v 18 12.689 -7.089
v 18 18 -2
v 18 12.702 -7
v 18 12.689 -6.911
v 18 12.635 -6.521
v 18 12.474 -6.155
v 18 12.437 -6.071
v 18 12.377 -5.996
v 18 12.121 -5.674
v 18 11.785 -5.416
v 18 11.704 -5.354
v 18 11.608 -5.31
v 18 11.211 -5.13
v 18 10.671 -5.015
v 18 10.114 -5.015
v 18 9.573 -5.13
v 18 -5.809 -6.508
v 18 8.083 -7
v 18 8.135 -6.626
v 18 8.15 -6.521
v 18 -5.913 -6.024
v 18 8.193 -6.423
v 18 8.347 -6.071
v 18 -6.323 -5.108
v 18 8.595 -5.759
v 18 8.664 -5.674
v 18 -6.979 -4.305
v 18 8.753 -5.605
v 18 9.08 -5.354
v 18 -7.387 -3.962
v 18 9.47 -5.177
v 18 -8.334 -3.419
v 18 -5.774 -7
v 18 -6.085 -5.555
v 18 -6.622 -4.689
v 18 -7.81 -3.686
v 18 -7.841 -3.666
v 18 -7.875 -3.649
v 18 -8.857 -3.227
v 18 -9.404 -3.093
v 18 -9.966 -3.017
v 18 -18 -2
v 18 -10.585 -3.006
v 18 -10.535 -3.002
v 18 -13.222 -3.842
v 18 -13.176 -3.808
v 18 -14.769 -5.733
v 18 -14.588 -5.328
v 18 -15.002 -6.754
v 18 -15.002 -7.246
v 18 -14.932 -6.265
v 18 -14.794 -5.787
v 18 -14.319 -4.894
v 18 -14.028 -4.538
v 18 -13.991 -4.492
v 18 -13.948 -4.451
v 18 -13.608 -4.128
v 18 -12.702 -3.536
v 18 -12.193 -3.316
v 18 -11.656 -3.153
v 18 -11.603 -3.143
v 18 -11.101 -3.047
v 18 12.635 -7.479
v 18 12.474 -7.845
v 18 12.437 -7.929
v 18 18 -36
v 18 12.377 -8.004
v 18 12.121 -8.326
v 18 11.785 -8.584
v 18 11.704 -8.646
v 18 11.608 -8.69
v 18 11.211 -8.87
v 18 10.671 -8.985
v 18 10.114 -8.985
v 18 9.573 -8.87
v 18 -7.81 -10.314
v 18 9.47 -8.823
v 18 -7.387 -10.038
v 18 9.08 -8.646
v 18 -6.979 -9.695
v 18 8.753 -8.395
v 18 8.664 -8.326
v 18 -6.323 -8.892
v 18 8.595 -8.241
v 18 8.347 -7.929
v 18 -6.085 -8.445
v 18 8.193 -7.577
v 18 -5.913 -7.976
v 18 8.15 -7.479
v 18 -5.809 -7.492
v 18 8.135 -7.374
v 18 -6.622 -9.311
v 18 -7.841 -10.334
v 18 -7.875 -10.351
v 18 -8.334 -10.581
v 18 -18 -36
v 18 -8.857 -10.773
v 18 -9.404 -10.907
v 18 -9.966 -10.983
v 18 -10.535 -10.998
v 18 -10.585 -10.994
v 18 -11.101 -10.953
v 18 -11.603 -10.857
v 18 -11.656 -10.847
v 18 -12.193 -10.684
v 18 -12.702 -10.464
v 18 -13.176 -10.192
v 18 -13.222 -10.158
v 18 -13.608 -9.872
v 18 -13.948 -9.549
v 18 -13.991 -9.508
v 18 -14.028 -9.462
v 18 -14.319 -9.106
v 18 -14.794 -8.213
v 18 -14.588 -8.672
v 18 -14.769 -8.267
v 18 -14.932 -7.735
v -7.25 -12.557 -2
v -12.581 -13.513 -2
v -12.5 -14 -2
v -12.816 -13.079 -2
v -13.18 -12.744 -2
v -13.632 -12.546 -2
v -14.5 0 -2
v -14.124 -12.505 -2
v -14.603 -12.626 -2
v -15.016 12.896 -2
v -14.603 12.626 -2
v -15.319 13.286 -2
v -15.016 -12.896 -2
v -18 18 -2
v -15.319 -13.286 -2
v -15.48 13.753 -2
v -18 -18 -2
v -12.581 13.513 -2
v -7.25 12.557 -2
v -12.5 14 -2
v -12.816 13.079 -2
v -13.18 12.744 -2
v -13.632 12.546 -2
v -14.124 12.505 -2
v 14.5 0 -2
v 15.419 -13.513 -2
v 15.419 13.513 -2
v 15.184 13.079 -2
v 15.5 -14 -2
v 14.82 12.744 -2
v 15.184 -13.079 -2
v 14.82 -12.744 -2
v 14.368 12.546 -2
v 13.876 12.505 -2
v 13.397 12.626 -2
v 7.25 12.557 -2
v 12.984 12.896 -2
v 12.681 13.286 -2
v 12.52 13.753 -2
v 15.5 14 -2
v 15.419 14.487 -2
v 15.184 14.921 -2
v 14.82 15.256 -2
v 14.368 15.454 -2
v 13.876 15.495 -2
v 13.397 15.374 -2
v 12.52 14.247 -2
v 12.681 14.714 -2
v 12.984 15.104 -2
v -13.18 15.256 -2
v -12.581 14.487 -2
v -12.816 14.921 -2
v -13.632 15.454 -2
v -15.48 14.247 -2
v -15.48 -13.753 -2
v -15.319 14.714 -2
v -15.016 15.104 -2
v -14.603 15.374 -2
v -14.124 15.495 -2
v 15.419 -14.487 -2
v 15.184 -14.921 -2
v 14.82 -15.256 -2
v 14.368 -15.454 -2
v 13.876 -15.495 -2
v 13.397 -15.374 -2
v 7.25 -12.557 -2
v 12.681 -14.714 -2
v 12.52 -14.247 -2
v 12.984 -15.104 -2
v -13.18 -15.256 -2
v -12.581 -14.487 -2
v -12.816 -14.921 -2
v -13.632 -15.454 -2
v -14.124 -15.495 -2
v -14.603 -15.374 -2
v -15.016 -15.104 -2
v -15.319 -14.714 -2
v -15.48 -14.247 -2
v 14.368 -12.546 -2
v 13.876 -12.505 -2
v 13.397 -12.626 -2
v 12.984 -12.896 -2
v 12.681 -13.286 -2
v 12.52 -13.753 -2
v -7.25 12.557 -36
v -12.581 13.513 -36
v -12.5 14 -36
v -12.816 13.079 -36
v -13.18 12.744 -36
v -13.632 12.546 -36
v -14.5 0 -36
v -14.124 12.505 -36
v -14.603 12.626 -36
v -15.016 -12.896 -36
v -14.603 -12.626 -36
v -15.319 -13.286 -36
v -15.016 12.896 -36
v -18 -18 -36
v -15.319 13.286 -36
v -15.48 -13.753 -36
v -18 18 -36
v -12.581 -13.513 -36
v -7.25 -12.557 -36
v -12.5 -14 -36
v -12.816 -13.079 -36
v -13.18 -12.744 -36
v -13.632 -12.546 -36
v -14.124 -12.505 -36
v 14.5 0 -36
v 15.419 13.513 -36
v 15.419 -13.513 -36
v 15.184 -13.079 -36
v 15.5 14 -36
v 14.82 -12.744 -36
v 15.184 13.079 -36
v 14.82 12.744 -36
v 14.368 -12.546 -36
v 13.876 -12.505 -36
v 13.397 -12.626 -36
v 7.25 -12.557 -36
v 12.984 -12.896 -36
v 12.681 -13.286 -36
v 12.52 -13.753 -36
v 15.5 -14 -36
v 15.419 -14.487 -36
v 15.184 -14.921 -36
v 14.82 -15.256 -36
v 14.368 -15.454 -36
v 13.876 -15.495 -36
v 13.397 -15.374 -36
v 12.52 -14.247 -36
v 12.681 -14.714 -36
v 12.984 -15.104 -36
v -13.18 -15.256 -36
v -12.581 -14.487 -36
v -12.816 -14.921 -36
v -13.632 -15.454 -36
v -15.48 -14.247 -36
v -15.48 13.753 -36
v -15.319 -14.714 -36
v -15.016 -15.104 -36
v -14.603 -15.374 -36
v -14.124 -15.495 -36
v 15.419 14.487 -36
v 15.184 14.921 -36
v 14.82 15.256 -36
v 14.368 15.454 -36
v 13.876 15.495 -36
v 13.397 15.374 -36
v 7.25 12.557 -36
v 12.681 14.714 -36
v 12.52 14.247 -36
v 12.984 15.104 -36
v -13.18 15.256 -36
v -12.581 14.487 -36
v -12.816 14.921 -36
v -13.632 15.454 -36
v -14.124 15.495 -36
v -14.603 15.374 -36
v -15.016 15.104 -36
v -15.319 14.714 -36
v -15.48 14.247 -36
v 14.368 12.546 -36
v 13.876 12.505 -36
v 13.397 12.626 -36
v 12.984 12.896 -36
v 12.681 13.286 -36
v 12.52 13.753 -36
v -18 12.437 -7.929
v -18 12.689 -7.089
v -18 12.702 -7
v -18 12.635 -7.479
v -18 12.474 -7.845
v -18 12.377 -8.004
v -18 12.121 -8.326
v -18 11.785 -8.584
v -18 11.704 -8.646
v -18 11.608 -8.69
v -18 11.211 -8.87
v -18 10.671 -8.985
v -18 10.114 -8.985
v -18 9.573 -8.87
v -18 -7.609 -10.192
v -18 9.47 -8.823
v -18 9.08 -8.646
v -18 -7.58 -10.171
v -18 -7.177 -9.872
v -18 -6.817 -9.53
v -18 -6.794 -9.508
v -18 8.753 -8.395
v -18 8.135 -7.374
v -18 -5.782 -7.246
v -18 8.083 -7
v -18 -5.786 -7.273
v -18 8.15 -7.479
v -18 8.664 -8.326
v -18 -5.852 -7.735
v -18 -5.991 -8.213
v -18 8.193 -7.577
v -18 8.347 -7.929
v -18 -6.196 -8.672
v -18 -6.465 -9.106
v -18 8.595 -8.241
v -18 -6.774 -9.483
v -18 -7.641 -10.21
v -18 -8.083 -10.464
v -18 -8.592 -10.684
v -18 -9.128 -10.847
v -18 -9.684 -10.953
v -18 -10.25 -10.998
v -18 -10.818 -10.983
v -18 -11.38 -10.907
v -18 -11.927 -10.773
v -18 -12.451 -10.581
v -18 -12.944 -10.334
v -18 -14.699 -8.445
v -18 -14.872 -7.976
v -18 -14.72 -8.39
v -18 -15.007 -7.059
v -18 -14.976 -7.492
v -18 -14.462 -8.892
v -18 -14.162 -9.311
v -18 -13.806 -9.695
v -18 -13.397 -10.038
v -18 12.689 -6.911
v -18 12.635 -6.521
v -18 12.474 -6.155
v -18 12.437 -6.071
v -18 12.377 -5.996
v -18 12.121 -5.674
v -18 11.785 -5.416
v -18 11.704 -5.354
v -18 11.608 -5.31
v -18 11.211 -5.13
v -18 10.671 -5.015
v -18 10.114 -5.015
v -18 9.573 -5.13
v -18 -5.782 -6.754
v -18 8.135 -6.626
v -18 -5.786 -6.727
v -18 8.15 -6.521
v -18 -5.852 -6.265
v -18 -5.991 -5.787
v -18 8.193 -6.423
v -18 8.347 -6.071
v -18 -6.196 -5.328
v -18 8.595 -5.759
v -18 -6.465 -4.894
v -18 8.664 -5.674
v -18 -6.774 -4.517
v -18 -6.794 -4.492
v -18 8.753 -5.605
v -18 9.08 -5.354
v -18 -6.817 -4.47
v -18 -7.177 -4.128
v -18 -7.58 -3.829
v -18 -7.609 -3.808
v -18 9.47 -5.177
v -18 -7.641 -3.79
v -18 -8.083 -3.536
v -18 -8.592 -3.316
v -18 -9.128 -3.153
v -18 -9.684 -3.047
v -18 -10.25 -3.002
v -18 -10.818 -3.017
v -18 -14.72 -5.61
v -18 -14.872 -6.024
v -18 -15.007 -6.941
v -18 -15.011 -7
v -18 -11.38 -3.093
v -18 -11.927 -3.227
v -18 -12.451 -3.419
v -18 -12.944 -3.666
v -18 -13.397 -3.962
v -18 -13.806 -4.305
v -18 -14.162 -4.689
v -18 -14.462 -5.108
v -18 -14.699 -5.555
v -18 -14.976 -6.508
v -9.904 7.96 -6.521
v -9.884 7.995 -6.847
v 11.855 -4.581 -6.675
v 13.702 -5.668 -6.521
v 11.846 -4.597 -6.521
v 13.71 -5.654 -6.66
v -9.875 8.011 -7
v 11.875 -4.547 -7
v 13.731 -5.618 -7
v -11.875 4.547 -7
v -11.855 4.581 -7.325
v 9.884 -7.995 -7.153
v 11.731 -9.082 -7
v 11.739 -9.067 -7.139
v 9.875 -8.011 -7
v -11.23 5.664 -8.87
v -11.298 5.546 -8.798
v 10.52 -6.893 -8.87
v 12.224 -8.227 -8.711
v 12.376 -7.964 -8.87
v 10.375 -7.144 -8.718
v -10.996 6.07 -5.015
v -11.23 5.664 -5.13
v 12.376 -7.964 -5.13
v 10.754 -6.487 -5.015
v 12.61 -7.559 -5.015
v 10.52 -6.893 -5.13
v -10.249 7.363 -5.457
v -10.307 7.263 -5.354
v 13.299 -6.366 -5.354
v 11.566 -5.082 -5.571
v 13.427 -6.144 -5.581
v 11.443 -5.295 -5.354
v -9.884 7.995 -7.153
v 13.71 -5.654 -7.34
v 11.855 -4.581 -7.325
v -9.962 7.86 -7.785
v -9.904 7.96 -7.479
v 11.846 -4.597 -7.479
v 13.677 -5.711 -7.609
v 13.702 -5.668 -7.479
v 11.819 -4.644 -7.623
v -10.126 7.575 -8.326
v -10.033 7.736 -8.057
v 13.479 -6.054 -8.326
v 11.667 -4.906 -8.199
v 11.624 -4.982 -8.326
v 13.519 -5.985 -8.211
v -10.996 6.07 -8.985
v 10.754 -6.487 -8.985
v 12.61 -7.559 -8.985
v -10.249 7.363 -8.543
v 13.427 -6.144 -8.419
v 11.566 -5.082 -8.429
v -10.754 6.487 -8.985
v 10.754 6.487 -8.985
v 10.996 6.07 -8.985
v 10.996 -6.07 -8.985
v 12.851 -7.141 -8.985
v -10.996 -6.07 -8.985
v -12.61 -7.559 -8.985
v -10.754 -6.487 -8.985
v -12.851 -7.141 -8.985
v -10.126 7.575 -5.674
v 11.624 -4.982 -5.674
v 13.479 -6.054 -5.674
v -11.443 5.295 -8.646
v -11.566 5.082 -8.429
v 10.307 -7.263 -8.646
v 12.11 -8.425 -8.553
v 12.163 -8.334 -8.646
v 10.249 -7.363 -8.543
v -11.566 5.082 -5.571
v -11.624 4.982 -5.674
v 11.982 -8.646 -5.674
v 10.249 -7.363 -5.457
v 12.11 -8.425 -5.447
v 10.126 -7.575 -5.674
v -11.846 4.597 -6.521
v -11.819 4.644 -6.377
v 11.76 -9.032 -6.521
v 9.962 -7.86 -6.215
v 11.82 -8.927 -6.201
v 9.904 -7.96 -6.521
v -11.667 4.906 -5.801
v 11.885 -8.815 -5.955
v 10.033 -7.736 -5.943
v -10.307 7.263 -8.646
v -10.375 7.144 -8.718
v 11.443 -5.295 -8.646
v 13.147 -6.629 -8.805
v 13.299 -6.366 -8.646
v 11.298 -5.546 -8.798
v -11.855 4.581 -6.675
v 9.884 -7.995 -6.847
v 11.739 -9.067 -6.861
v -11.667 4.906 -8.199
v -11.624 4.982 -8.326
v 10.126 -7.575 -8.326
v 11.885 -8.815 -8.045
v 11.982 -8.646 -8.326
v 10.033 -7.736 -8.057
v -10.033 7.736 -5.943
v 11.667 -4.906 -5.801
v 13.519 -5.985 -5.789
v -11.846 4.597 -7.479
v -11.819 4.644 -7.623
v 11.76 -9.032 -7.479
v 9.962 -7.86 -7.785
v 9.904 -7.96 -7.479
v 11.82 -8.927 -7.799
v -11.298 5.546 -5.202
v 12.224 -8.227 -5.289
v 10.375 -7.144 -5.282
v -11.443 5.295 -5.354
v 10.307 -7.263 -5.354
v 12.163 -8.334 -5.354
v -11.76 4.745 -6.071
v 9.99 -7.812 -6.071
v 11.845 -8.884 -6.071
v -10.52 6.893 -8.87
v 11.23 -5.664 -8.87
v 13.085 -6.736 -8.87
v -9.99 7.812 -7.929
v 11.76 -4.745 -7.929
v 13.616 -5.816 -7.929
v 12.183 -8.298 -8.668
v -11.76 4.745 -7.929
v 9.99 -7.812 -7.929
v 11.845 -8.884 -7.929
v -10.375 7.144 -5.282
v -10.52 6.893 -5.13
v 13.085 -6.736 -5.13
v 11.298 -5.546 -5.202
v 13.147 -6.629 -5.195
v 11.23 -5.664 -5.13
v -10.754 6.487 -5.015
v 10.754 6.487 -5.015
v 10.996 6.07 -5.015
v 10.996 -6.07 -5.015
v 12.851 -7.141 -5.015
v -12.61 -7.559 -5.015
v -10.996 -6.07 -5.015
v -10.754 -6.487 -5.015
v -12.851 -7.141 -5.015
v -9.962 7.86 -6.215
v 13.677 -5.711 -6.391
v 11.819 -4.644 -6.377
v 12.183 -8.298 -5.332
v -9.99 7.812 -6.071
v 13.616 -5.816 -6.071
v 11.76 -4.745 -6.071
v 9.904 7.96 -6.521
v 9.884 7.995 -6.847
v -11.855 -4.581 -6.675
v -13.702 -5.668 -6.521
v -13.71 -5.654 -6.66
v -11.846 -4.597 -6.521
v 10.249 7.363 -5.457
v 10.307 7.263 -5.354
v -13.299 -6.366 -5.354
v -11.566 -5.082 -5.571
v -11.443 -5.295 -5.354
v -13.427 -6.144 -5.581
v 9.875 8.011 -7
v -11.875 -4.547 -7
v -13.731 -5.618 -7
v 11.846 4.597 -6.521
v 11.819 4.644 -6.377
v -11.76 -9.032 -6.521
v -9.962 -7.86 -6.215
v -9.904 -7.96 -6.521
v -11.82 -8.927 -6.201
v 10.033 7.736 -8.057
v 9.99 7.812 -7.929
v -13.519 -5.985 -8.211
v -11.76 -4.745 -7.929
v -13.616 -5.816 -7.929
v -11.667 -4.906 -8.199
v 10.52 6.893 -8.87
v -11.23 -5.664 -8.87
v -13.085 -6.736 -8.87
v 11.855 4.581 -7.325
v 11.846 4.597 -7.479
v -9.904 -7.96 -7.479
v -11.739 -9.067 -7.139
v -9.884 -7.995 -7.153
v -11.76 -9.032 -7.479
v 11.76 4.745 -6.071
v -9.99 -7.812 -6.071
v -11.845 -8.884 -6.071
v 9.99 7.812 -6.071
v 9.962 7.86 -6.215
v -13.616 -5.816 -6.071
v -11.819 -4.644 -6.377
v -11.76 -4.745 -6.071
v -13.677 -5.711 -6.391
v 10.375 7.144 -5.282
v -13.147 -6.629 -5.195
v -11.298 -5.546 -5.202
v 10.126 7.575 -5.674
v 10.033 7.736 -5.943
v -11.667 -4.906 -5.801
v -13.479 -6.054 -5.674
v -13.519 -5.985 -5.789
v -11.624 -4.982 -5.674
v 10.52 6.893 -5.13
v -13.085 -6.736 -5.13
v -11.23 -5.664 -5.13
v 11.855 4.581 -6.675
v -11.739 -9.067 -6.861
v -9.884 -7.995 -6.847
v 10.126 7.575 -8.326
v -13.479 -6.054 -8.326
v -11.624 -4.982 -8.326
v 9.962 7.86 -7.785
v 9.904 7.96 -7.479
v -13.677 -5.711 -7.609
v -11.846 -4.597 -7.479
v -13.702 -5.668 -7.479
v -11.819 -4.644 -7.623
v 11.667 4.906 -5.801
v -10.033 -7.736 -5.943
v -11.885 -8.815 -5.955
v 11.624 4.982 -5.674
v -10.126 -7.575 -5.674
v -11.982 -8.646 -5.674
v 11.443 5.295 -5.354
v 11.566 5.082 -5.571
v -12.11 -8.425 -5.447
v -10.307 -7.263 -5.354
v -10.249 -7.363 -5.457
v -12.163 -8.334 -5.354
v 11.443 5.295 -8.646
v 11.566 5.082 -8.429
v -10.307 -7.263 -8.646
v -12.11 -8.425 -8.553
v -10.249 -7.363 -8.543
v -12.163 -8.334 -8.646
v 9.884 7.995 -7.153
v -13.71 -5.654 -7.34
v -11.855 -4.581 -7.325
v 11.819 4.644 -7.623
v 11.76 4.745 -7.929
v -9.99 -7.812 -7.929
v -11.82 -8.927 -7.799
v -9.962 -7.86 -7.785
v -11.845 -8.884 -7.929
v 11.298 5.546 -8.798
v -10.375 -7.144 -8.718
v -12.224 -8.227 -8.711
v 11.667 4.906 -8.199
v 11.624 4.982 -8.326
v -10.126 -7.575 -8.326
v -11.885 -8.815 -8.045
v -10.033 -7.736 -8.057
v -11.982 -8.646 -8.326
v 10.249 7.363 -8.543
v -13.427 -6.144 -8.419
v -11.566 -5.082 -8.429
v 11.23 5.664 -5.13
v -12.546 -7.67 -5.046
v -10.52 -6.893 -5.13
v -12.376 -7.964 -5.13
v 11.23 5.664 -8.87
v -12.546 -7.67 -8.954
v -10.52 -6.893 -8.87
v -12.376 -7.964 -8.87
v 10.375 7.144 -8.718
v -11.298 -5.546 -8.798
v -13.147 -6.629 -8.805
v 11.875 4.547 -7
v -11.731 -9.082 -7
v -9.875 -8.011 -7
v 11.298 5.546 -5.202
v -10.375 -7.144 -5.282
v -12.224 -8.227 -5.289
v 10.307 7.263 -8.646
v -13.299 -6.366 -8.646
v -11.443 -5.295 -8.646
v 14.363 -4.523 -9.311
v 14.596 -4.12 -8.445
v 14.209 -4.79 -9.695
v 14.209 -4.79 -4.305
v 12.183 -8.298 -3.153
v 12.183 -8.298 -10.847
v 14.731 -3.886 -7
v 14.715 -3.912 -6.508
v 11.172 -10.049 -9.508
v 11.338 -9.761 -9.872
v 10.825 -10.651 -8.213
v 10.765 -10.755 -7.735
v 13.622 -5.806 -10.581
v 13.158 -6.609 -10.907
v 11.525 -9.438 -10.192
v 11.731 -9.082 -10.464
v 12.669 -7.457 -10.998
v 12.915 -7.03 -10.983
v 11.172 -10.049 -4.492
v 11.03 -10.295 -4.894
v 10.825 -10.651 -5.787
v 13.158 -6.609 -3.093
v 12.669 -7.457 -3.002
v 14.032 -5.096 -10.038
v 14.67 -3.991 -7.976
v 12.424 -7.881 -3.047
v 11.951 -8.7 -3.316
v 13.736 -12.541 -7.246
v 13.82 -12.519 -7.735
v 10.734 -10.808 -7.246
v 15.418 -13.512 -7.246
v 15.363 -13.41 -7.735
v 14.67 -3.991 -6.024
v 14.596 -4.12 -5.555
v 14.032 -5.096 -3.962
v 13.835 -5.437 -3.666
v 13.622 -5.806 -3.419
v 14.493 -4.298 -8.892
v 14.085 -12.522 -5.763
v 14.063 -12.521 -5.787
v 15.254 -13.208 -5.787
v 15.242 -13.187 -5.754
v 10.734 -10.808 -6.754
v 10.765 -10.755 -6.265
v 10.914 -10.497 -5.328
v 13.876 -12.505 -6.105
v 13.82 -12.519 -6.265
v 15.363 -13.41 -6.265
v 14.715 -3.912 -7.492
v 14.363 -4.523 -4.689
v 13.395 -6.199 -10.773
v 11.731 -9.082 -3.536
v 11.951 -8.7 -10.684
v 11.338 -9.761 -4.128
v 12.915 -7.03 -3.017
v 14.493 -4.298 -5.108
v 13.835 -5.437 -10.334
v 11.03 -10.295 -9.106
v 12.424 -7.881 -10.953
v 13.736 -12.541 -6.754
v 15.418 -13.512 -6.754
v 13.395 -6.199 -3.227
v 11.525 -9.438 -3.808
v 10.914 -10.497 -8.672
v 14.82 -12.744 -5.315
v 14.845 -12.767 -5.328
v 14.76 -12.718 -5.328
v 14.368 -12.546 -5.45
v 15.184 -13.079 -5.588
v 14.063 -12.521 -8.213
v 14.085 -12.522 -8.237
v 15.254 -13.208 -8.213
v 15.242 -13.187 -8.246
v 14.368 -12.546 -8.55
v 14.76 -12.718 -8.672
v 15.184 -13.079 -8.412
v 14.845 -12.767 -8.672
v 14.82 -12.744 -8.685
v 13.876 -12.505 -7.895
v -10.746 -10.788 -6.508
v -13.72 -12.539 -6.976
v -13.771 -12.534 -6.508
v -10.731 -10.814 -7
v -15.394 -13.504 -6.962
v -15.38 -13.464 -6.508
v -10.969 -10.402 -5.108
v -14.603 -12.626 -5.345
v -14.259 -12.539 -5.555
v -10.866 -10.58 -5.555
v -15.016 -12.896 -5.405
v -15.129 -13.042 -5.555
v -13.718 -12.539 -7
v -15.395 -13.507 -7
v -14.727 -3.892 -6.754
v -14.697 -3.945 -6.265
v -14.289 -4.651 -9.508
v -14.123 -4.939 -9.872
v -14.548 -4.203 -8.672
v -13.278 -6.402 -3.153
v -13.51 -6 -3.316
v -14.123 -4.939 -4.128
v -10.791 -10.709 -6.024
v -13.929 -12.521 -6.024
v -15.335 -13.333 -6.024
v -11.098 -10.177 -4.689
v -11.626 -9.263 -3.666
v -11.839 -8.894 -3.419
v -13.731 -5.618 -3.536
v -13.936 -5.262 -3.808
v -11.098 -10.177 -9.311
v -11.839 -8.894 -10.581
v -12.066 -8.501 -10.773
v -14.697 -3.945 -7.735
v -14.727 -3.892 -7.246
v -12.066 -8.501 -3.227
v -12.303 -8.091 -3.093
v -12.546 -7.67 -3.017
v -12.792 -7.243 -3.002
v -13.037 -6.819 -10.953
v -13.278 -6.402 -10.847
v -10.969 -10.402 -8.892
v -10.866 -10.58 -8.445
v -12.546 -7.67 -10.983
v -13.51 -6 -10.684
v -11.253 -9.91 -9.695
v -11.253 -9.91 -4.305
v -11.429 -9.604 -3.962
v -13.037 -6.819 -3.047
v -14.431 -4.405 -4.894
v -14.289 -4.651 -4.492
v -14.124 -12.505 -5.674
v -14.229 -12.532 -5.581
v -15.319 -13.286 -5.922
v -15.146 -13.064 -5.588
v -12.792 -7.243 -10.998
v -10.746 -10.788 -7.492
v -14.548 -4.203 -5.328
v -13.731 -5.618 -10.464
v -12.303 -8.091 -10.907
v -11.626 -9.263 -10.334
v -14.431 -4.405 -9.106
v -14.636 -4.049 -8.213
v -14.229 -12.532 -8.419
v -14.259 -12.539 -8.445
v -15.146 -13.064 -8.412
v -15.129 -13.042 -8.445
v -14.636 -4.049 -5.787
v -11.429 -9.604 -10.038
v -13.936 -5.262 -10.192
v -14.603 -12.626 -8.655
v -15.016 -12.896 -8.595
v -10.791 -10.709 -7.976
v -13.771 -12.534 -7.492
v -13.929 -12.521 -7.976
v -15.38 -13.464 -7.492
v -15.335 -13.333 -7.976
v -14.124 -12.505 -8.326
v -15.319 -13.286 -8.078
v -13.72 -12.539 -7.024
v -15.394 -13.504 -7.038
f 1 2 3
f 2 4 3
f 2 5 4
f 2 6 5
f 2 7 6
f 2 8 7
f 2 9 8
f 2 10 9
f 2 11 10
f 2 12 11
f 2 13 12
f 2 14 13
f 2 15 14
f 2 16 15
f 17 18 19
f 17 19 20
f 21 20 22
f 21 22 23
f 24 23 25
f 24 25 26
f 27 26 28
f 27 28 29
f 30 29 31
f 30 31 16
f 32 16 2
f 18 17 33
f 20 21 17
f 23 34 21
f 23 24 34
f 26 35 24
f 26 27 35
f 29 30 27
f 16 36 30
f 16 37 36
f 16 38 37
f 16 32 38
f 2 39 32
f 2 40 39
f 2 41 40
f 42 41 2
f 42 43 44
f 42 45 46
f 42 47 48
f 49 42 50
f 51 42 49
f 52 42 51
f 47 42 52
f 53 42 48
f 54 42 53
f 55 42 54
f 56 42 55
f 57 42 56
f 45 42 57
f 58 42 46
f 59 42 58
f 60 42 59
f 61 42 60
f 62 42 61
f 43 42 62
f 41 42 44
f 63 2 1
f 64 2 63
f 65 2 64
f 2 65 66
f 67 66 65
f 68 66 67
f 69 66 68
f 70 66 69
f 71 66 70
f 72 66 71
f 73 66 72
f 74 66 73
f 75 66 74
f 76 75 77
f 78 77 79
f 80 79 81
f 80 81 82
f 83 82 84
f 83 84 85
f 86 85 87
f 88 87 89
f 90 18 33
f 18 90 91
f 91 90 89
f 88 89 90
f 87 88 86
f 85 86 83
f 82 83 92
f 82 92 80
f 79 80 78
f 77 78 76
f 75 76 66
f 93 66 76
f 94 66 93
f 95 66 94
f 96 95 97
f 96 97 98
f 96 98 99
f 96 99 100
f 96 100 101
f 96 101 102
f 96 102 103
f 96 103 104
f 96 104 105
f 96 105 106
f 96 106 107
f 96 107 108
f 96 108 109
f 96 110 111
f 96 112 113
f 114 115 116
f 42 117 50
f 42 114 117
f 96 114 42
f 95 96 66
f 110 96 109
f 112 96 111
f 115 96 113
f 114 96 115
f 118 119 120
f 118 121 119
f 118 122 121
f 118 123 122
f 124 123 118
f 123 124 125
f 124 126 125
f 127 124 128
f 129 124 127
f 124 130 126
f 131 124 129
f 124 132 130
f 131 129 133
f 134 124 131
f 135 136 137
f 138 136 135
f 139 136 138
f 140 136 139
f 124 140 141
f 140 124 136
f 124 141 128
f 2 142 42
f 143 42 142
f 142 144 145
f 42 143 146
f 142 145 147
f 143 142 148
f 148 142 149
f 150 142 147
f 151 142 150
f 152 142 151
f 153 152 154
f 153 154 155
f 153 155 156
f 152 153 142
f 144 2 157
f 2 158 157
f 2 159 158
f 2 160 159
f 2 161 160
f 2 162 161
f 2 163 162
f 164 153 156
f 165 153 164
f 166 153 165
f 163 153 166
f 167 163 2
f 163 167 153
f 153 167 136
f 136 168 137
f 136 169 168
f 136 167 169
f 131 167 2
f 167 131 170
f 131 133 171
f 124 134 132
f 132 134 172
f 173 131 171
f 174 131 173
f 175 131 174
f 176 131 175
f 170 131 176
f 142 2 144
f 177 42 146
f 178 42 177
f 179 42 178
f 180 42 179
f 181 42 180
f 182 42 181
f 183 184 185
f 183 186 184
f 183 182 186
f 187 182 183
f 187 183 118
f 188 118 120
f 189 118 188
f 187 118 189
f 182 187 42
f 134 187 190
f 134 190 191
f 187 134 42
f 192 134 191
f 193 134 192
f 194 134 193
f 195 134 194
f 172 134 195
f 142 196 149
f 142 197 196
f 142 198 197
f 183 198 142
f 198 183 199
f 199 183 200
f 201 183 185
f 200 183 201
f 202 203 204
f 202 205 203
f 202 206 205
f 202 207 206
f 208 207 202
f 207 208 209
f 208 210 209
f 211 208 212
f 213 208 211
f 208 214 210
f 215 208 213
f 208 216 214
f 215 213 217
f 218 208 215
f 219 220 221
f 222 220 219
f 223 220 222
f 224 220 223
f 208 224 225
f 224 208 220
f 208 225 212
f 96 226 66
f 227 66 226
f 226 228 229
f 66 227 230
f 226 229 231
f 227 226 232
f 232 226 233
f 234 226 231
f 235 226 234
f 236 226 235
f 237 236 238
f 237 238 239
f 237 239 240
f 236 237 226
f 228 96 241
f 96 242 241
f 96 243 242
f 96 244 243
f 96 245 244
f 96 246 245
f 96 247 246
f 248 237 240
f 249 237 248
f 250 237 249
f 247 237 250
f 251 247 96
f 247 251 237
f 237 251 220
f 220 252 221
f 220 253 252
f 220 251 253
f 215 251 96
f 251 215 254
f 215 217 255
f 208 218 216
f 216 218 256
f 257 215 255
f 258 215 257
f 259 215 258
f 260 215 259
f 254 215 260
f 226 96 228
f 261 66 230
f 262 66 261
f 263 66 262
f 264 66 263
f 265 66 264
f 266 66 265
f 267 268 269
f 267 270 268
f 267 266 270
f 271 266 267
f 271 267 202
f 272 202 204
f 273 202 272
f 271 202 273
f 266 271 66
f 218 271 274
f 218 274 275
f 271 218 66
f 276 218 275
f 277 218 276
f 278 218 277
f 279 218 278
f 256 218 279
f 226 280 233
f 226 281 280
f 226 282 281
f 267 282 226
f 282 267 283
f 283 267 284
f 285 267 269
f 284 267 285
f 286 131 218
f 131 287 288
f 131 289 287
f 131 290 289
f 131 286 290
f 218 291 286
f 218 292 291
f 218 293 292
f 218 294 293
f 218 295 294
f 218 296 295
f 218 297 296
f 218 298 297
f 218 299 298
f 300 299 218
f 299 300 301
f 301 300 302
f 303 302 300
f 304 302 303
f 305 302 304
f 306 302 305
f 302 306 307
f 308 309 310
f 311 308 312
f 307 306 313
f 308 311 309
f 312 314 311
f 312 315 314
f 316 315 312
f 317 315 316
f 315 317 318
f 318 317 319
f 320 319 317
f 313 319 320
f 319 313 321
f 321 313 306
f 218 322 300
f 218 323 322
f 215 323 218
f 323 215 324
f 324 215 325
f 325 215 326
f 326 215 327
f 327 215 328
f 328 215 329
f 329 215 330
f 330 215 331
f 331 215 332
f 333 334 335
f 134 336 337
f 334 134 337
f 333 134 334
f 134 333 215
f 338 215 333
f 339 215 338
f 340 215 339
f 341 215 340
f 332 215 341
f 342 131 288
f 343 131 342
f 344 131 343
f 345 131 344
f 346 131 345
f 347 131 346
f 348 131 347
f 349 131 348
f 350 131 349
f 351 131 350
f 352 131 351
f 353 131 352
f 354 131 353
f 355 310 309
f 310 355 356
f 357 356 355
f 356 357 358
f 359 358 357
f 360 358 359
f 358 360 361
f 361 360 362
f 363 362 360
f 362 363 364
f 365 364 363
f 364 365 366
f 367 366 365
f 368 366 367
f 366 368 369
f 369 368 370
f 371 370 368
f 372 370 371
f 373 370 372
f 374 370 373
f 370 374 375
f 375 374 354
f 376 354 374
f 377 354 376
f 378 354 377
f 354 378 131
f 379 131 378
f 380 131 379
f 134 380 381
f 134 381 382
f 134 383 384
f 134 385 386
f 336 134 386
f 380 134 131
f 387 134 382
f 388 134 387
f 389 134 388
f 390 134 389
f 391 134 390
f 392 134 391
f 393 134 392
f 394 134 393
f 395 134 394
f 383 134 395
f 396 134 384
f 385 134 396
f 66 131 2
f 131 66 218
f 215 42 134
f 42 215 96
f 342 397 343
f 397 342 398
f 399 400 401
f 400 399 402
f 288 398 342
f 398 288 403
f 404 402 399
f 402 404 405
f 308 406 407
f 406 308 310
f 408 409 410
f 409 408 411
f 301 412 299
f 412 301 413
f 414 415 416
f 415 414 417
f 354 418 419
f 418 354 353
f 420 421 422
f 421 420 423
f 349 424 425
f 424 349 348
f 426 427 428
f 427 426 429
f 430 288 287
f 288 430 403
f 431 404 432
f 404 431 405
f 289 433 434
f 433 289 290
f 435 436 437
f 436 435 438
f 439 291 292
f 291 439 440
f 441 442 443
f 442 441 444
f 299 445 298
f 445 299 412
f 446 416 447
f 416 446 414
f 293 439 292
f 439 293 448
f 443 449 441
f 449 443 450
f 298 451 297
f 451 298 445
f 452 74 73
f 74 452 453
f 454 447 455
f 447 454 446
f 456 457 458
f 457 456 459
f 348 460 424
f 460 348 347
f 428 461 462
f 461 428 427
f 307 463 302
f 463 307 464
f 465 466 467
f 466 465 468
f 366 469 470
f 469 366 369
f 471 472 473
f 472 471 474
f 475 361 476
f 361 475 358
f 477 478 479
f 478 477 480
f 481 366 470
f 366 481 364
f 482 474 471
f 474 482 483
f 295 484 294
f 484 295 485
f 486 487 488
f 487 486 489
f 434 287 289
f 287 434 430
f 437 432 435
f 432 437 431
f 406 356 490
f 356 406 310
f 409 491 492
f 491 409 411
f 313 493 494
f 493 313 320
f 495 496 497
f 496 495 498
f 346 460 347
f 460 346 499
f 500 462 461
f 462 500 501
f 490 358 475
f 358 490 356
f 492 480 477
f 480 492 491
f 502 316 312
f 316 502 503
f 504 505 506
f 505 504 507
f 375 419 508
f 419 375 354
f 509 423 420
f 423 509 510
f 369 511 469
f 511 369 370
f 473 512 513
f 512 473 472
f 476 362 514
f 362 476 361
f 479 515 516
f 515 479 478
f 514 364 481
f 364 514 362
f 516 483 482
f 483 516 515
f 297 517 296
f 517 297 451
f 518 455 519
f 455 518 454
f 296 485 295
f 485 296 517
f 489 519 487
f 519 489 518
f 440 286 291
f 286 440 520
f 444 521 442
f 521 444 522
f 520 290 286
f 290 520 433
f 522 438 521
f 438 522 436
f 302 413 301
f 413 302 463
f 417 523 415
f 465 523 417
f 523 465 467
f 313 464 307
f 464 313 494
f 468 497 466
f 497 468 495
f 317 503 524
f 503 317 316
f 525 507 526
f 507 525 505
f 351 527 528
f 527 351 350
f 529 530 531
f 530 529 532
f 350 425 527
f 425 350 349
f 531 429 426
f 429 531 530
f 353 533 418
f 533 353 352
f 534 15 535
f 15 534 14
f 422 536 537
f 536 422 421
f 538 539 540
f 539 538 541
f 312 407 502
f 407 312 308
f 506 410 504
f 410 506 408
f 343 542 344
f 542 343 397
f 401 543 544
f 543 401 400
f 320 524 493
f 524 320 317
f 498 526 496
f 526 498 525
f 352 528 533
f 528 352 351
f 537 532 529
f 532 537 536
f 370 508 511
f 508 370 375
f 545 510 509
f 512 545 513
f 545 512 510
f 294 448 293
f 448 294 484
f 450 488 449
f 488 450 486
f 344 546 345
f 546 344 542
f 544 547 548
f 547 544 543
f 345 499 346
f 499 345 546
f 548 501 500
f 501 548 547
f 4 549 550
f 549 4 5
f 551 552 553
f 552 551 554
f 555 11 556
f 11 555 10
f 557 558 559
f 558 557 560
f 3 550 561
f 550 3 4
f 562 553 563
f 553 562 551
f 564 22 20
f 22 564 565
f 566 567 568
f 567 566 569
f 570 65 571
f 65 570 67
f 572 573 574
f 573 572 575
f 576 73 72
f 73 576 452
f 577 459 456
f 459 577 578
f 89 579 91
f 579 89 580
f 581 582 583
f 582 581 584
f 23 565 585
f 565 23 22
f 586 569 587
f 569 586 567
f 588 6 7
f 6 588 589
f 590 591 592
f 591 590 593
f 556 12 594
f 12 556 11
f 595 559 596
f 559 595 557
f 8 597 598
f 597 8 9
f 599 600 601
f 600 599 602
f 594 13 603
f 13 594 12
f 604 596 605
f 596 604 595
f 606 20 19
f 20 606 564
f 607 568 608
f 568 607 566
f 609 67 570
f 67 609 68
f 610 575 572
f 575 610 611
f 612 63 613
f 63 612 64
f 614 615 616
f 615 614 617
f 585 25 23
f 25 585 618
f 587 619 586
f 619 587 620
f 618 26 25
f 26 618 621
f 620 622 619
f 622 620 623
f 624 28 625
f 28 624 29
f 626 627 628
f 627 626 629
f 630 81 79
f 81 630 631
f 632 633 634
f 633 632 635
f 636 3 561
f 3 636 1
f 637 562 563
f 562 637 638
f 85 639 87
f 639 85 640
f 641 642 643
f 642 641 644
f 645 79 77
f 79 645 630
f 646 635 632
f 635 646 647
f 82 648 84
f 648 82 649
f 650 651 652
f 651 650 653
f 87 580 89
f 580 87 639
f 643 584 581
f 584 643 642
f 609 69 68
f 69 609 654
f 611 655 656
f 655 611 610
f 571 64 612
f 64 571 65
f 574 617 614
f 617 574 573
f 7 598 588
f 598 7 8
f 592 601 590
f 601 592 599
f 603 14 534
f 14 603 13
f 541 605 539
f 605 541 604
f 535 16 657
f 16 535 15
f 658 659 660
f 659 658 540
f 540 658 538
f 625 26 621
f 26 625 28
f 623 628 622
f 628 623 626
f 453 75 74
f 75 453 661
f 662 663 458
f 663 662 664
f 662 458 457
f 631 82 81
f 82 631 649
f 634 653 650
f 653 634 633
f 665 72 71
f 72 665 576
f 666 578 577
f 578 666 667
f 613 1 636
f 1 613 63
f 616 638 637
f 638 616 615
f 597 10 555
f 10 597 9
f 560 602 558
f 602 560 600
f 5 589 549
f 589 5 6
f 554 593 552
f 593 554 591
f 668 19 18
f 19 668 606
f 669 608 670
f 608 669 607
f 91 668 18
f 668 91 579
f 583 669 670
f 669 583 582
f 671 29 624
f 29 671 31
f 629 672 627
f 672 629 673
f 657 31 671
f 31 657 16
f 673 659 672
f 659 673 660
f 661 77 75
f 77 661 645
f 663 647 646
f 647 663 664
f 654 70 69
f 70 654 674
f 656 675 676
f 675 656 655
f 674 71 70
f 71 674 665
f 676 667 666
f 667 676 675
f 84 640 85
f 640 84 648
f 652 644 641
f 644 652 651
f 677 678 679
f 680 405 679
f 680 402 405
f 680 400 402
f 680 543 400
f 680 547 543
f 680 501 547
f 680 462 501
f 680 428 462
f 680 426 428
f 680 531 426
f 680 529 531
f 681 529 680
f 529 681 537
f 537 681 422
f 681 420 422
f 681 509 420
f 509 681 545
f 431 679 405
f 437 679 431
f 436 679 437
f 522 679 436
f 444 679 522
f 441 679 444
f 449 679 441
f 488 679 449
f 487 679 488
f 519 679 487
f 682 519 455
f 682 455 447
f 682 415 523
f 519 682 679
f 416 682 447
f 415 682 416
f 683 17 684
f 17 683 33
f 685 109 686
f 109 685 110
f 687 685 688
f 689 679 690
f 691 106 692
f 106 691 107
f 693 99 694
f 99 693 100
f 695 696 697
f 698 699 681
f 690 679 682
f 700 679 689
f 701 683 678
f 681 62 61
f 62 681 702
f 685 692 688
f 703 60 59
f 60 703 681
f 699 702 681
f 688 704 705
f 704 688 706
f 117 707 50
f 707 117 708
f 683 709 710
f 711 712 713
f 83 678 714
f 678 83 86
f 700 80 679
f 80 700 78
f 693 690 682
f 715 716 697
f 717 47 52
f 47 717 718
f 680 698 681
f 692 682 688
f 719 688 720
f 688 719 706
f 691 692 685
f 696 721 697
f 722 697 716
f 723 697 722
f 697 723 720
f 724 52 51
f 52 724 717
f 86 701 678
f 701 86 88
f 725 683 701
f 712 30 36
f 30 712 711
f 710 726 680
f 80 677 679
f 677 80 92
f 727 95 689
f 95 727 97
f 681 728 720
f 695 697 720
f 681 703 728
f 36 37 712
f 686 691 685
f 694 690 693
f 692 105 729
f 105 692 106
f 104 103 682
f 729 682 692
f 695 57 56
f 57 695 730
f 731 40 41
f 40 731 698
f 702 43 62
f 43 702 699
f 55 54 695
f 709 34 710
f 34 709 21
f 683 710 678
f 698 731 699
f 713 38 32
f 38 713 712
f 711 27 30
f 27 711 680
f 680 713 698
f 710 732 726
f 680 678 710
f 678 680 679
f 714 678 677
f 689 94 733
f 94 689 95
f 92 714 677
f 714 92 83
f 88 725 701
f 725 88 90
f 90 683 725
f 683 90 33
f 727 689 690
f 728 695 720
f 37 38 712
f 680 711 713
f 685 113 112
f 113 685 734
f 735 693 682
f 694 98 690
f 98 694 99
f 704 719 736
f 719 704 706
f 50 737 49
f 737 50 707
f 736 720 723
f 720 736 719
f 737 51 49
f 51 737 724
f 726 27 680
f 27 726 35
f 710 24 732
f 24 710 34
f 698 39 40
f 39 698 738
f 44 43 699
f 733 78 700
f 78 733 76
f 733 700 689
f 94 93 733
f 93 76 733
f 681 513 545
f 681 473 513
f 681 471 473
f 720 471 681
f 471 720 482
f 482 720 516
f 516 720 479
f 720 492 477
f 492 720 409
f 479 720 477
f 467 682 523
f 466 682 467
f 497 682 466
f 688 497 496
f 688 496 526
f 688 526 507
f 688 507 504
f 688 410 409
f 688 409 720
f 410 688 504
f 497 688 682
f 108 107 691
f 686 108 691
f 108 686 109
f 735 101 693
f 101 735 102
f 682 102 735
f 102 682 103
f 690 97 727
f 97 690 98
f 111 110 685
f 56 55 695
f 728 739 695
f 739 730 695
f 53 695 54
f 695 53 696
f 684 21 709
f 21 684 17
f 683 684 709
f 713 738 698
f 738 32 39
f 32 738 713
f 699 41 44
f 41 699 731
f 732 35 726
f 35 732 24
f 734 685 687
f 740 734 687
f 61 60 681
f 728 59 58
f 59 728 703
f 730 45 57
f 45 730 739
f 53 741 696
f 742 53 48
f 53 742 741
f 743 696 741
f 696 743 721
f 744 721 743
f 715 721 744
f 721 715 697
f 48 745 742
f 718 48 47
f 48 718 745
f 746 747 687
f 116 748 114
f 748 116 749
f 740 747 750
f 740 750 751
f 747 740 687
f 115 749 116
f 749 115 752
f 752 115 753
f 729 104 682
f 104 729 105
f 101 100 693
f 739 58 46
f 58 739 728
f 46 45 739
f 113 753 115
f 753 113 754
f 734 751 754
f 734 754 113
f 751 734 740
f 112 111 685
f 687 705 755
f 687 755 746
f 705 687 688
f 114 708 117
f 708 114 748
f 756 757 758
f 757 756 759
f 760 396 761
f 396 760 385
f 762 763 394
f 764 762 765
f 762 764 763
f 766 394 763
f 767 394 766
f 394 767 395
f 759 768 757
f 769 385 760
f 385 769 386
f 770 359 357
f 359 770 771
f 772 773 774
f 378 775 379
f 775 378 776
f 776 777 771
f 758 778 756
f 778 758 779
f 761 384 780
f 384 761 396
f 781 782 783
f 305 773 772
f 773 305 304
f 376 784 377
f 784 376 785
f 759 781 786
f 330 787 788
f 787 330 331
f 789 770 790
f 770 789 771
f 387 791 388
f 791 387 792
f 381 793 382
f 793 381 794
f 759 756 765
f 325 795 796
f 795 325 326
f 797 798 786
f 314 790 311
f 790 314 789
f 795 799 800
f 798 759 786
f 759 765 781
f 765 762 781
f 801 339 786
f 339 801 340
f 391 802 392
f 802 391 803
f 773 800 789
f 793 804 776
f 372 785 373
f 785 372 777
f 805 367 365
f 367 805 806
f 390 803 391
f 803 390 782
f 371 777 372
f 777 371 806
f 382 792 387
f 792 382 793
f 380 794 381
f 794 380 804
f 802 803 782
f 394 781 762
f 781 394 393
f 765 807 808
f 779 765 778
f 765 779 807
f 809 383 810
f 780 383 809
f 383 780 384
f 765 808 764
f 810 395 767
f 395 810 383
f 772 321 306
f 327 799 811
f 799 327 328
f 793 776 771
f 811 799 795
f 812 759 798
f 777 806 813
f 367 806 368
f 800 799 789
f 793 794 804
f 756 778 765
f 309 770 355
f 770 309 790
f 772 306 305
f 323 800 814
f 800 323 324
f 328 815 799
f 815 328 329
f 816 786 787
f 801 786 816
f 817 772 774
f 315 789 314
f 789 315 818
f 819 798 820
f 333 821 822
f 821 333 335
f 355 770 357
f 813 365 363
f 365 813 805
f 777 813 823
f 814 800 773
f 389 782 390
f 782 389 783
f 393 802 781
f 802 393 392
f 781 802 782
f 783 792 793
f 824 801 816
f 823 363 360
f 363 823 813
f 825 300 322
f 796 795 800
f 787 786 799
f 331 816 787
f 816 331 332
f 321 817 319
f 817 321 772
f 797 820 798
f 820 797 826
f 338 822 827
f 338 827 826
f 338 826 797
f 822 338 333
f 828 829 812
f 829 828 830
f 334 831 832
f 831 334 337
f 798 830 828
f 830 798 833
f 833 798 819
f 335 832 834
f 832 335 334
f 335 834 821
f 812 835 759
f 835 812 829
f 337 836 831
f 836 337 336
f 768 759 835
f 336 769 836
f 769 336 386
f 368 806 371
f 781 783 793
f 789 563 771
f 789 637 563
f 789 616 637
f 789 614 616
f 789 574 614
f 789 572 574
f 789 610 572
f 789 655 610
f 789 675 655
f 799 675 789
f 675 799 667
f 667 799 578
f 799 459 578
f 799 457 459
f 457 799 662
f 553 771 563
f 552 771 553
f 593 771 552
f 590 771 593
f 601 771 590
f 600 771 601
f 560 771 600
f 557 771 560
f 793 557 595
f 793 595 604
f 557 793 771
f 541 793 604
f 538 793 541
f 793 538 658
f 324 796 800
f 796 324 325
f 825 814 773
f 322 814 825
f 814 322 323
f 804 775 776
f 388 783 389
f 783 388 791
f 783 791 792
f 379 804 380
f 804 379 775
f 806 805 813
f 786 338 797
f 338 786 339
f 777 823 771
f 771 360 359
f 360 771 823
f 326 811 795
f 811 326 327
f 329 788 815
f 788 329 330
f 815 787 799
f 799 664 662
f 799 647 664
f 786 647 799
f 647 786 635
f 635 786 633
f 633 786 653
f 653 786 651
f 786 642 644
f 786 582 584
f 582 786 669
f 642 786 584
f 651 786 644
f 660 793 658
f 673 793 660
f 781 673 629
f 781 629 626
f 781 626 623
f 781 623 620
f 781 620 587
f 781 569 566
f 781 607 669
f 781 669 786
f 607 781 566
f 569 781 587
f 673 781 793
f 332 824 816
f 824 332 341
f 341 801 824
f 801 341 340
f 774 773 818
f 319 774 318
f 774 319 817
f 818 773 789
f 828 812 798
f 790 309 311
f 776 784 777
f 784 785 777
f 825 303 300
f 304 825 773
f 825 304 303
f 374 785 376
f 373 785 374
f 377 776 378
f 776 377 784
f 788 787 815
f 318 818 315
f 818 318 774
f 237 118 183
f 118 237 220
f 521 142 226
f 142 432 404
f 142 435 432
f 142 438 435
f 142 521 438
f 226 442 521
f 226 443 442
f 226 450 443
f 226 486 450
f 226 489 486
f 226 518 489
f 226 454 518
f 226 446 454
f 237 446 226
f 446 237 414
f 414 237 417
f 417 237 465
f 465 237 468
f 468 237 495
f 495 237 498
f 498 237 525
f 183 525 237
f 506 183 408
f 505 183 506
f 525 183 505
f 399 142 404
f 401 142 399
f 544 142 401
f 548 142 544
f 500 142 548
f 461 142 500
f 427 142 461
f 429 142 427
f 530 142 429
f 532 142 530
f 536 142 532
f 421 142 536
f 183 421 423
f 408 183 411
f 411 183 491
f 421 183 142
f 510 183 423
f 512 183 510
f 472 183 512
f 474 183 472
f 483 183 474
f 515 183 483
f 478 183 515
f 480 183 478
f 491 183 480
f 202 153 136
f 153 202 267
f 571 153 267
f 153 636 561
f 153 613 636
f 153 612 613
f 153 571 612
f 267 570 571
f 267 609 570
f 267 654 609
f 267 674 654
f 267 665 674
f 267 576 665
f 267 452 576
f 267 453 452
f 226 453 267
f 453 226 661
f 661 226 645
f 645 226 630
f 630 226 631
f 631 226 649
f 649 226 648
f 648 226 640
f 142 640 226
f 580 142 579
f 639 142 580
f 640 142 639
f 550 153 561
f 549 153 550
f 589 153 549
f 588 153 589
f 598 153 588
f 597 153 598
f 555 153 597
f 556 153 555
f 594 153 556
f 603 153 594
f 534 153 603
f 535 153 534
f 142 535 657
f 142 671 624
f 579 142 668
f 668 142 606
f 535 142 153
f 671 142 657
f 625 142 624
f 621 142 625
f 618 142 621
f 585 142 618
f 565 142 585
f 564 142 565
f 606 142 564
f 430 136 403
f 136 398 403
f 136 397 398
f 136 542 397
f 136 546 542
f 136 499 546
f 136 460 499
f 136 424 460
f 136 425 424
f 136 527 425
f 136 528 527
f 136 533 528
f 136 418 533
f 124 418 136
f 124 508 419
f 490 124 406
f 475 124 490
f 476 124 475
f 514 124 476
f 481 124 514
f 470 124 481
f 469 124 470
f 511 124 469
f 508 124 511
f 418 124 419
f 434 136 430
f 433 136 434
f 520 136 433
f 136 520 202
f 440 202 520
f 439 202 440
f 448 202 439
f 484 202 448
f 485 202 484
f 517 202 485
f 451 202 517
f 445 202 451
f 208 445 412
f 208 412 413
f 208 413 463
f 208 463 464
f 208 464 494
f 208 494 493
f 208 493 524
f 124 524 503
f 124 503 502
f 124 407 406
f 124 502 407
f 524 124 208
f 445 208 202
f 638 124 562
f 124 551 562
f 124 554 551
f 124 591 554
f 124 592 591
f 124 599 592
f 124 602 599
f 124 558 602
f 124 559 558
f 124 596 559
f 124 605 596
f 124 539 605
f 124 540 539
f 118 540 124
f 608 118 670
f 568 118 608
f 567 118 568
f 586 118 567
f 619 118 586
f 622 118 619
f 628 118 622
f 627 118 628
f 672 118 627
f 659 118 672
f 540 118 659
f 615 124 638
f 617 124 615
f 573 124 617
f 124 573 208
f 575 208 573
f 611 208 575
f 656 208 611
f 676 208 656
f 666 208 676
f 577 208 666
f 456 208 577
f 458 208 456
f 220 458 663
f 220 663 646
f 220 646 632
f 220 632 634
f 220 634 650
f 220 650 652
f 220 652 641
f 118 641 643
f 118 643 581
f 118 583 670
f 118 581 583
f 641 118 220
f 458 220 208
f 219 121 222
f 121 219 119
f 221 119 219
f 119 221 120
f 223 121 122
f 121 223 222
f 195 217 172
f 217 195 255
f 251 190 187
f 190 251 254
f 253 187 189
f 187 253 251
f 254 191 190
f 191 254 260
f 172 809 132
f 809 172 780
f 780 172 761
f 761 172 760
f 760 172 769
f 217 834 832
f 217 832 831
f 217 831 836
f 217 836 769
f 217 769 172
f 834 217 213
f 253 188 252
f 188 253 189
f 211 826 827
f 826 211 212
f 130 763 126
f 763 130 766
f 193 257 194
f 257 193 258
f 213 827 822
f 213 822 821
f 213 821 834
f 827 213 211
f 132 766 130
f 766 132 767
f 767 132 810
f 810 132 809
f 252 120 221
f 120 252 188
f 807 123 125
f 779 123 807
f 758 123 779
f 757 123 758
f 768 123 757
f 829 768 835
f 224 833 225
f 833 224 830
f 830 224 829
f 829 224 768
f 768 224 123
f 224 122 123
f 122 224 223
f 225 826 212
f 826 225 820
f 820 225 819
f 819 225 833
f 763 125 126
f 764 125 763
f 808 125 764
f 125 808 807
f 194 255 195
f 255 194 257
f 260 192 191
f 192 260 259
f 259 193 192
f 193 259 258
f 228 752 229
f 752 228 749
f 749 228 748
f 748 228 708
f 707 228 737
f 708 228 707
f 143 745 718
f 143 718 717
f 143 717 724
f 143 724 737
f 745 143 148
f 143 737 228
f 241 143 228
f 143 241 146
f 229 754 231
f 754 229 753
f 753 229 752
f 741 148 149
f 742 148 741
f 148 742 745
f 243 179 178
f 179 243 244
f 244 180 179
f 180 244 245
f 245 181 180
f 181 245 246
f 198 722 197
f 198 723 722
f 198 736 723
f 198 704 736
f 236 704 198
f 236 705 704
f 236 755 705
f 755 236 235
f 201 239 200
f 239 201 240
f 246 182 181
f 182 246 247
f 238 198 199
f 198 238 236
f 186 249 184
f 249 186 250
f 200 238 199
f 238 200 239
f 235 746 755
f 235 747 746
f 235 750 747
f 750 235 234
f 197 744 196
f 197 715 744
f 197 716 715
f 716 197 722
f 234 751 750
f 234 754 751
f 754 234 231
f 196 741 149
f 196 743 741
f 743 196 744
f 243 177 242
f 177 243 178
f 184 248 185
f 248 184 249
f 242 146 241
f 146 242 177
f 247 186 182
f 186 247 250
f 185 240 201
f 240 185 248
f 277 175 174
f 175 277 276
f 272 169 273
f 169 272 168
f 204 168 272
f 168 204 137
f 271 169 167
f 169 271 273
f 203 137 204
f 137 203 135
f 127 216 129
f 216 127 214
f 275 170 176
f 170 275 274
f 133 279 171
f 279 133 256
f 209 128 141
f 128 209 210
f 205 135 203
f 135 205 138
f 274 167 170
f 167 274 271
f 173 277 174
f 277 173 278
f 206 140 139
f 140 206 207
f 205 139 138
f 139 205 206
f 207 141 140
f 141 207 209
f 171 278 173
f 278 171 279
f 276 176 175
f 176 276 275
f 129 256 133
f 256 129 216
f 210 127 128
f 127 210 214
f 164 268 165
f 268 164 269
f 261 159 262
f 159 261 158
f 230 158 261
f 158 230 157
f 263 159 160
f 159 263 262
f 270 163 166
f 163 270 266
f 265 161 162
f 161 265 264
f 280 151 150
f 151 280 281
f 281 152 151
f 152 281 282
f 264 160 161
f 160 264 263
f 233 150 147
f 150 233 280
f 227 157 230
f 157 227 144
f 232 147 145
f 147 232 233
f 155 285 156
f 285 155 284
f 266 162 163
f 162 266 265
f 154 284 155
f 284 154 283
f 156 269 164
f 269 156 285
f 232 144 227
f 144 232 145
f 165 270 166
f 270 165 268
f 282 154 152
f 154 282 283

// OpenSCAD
$fa=2.1;
$fs=0.5;
mdist = 56;
mhole = 4.5;

bd = 70;
bh = 4;

hex = 28;
hex_h = 10;

//basemount();
//translate([0,0,0]) rotate([180,0,0]) logitech_mount();

//translate([0,0,0]) rotate([180,0,0]) f1_mount();

translate([0,0,-30]) f1_mount();
//logitech_mount();

module basemount() {
    translate([0,0,-bh-5]) difference() {
       union() {
           cylinder(d=bd, h=bh,$fn=6);
           
           cylinder(d=hex, h=bh+hex_h, $fn=6);
       }
       rotate([0,0,60*1]) translate([mdist/2, 0,-0.5]) cylinder(d=mhole, h=bh+1);
       rotate([0,0,60*2]) translate([mdist/2, 0,-0.5]) cylinder(d=mhole, h=bh+1);
       rotate([0,0,60*3]) translate([mdist/2, 0,-0.5]) cylinder(d=mhole, h=bh+1);
       rotate([0,0,60*4]) translate([mdist/2, 0,-0.5]) cylinder(d=mhole, h=bh+1);
       rotate([0,0,60*5]) translate([mdist/2, 0,-0.5]) cylinder(d=mhole, h=bh+1);
       rotate([0,0,60*6]) translate([mdist/2, 0,-0.5]) cylinder(d=mhole, h=bh+1);
       
       %color("blue")rotate([0,0,60*6]) translate([mdist/2, 0,bh]) cylinder(d=8, h=5);
       
       
       rotate([0,0,60*1]) translate([0,70/2,bh+5]) rotate([90,0,0])cylinder(d=3.85, h=70);
       rotate([0,0,60*2]) translate([0,70/2,bh+5]) rotate([90,0,0])cylinder(d=3.85, h=70);
       
   }
    
}


module logitech_mount() {
    extrahole_d = 15.2;
    extrahole_h = 2;
    M4 = 2.85;
    bh = 4;
    
    translate([0,0,-6]) difference() {
       union() {
           cylinder(d=bd, h=bh,$fn=6);
           
           cylinder(d=hex+6, h=hex_h+0.5, $fn=6);
           for ( i = [0 : 1 : 6] ){
               rotate([0,0,60*i]) translate([mdist/2, 0,bh]) cylinder(d=M4+3, h=2);
               
           }
       }
       for ( i = [0 : 1 : 6] ){
           rotate([0,0,60*i]) translate([mdist/2, 0,-0.5]) cylinder(d=M4, h=bh+100);
           rotate([0,0,60*i]) translate([mdist/2, 0,-0.5]) ring();
       }

       rotate([0,0,60*1]) translate([0,70/2,6]) rotate([90,0,0])cylinder(d=4, h=70);
       rotate([0,0,60*2]) translate([0,70/2,6]) rotate([90,0,0])cylinder(d=4, h=70);
       
       rotate([0,0,60*1]) translate([0,-hex/2-0.7,6]) rotate([90,0,0])cylinder(d=8, h=70);
       rotate([0,0,60*5]) translate([0,-hex/2-0.7,6]) rotate([90,0,0])cylinder(d=8, h=70);
       
       translate([0,0,-1]) cylinder(d=hex+1, h=bh+hex_h+1, $fn=6);
       
       translate([0,20,0])cube([3,20,bh]);
       rotate([0,0,180]) translate([0,20,0])cube([3,20,bh]);
       
   }
    
    
}

module ring() {
    extrahole_d = 15.2;
    extrahole_h = 2;
    difference() {
       union() {
            cylinder(d=extrahole_d, h=extrahole_h);
           
       }
       cylinder(d=9, h=extrahole_h);
   }
}


module f1_mount() {
    extrahole_d = 15.2;
    extrahole_h = 2;
    M4 = 2.85;
    bh = 4;
    hex_mount = 34-5;
    
    f1_dist = 28;
    translate([0,0,-6]) difference() {
       union() {
          // cylinder(d=bd, h=bh,$fn=6);
           translate([-36/2, -36/2, 0]) cube([36,36,34]);
           
           cylinder(d=hex+6, h=hex_h+0.5, $fn=6);
           
       }
       

       rotate([0,0,60*1]) translate([0,70/2,hex_mount]) rotate([90,0,0])cylinder(d=4, h=70);
       rotate([0,0,60*2]) translate([0,70/2,hex_mount]) rotate([90,0,0])cylinder(d=4, h=70);
       
       rotate([0,0,60*1]) translate([0,-hex/2-0.7,hex_mount]) rotate([90,0,0])cylinder(d=8, h=70);
       rotate([0,0,60*5]) translate([0,-hex/2-0.7,hex_mount]) rotate([90,0,0])cylinder(d=8, h=70);
       
       translate([0,0,-1]) cylinder(d=hex+1, h=40, $fn=6);
       
       translate([-f1_dist/2, -f1_dist/2,0]) cylinder(d=3, h = 40);
       translate([f1_dist/2, -f1_dist/2,0]) cylinder(d=3, h = 40);
       translate([-f1_dist/2, f1_dist/2,0]) cylinder(d=3, h = 40);
       translate([f1_dist/2, f1_dist/2,0]) cylinder(d=3, h = 40);
       
   }
    
    
}
